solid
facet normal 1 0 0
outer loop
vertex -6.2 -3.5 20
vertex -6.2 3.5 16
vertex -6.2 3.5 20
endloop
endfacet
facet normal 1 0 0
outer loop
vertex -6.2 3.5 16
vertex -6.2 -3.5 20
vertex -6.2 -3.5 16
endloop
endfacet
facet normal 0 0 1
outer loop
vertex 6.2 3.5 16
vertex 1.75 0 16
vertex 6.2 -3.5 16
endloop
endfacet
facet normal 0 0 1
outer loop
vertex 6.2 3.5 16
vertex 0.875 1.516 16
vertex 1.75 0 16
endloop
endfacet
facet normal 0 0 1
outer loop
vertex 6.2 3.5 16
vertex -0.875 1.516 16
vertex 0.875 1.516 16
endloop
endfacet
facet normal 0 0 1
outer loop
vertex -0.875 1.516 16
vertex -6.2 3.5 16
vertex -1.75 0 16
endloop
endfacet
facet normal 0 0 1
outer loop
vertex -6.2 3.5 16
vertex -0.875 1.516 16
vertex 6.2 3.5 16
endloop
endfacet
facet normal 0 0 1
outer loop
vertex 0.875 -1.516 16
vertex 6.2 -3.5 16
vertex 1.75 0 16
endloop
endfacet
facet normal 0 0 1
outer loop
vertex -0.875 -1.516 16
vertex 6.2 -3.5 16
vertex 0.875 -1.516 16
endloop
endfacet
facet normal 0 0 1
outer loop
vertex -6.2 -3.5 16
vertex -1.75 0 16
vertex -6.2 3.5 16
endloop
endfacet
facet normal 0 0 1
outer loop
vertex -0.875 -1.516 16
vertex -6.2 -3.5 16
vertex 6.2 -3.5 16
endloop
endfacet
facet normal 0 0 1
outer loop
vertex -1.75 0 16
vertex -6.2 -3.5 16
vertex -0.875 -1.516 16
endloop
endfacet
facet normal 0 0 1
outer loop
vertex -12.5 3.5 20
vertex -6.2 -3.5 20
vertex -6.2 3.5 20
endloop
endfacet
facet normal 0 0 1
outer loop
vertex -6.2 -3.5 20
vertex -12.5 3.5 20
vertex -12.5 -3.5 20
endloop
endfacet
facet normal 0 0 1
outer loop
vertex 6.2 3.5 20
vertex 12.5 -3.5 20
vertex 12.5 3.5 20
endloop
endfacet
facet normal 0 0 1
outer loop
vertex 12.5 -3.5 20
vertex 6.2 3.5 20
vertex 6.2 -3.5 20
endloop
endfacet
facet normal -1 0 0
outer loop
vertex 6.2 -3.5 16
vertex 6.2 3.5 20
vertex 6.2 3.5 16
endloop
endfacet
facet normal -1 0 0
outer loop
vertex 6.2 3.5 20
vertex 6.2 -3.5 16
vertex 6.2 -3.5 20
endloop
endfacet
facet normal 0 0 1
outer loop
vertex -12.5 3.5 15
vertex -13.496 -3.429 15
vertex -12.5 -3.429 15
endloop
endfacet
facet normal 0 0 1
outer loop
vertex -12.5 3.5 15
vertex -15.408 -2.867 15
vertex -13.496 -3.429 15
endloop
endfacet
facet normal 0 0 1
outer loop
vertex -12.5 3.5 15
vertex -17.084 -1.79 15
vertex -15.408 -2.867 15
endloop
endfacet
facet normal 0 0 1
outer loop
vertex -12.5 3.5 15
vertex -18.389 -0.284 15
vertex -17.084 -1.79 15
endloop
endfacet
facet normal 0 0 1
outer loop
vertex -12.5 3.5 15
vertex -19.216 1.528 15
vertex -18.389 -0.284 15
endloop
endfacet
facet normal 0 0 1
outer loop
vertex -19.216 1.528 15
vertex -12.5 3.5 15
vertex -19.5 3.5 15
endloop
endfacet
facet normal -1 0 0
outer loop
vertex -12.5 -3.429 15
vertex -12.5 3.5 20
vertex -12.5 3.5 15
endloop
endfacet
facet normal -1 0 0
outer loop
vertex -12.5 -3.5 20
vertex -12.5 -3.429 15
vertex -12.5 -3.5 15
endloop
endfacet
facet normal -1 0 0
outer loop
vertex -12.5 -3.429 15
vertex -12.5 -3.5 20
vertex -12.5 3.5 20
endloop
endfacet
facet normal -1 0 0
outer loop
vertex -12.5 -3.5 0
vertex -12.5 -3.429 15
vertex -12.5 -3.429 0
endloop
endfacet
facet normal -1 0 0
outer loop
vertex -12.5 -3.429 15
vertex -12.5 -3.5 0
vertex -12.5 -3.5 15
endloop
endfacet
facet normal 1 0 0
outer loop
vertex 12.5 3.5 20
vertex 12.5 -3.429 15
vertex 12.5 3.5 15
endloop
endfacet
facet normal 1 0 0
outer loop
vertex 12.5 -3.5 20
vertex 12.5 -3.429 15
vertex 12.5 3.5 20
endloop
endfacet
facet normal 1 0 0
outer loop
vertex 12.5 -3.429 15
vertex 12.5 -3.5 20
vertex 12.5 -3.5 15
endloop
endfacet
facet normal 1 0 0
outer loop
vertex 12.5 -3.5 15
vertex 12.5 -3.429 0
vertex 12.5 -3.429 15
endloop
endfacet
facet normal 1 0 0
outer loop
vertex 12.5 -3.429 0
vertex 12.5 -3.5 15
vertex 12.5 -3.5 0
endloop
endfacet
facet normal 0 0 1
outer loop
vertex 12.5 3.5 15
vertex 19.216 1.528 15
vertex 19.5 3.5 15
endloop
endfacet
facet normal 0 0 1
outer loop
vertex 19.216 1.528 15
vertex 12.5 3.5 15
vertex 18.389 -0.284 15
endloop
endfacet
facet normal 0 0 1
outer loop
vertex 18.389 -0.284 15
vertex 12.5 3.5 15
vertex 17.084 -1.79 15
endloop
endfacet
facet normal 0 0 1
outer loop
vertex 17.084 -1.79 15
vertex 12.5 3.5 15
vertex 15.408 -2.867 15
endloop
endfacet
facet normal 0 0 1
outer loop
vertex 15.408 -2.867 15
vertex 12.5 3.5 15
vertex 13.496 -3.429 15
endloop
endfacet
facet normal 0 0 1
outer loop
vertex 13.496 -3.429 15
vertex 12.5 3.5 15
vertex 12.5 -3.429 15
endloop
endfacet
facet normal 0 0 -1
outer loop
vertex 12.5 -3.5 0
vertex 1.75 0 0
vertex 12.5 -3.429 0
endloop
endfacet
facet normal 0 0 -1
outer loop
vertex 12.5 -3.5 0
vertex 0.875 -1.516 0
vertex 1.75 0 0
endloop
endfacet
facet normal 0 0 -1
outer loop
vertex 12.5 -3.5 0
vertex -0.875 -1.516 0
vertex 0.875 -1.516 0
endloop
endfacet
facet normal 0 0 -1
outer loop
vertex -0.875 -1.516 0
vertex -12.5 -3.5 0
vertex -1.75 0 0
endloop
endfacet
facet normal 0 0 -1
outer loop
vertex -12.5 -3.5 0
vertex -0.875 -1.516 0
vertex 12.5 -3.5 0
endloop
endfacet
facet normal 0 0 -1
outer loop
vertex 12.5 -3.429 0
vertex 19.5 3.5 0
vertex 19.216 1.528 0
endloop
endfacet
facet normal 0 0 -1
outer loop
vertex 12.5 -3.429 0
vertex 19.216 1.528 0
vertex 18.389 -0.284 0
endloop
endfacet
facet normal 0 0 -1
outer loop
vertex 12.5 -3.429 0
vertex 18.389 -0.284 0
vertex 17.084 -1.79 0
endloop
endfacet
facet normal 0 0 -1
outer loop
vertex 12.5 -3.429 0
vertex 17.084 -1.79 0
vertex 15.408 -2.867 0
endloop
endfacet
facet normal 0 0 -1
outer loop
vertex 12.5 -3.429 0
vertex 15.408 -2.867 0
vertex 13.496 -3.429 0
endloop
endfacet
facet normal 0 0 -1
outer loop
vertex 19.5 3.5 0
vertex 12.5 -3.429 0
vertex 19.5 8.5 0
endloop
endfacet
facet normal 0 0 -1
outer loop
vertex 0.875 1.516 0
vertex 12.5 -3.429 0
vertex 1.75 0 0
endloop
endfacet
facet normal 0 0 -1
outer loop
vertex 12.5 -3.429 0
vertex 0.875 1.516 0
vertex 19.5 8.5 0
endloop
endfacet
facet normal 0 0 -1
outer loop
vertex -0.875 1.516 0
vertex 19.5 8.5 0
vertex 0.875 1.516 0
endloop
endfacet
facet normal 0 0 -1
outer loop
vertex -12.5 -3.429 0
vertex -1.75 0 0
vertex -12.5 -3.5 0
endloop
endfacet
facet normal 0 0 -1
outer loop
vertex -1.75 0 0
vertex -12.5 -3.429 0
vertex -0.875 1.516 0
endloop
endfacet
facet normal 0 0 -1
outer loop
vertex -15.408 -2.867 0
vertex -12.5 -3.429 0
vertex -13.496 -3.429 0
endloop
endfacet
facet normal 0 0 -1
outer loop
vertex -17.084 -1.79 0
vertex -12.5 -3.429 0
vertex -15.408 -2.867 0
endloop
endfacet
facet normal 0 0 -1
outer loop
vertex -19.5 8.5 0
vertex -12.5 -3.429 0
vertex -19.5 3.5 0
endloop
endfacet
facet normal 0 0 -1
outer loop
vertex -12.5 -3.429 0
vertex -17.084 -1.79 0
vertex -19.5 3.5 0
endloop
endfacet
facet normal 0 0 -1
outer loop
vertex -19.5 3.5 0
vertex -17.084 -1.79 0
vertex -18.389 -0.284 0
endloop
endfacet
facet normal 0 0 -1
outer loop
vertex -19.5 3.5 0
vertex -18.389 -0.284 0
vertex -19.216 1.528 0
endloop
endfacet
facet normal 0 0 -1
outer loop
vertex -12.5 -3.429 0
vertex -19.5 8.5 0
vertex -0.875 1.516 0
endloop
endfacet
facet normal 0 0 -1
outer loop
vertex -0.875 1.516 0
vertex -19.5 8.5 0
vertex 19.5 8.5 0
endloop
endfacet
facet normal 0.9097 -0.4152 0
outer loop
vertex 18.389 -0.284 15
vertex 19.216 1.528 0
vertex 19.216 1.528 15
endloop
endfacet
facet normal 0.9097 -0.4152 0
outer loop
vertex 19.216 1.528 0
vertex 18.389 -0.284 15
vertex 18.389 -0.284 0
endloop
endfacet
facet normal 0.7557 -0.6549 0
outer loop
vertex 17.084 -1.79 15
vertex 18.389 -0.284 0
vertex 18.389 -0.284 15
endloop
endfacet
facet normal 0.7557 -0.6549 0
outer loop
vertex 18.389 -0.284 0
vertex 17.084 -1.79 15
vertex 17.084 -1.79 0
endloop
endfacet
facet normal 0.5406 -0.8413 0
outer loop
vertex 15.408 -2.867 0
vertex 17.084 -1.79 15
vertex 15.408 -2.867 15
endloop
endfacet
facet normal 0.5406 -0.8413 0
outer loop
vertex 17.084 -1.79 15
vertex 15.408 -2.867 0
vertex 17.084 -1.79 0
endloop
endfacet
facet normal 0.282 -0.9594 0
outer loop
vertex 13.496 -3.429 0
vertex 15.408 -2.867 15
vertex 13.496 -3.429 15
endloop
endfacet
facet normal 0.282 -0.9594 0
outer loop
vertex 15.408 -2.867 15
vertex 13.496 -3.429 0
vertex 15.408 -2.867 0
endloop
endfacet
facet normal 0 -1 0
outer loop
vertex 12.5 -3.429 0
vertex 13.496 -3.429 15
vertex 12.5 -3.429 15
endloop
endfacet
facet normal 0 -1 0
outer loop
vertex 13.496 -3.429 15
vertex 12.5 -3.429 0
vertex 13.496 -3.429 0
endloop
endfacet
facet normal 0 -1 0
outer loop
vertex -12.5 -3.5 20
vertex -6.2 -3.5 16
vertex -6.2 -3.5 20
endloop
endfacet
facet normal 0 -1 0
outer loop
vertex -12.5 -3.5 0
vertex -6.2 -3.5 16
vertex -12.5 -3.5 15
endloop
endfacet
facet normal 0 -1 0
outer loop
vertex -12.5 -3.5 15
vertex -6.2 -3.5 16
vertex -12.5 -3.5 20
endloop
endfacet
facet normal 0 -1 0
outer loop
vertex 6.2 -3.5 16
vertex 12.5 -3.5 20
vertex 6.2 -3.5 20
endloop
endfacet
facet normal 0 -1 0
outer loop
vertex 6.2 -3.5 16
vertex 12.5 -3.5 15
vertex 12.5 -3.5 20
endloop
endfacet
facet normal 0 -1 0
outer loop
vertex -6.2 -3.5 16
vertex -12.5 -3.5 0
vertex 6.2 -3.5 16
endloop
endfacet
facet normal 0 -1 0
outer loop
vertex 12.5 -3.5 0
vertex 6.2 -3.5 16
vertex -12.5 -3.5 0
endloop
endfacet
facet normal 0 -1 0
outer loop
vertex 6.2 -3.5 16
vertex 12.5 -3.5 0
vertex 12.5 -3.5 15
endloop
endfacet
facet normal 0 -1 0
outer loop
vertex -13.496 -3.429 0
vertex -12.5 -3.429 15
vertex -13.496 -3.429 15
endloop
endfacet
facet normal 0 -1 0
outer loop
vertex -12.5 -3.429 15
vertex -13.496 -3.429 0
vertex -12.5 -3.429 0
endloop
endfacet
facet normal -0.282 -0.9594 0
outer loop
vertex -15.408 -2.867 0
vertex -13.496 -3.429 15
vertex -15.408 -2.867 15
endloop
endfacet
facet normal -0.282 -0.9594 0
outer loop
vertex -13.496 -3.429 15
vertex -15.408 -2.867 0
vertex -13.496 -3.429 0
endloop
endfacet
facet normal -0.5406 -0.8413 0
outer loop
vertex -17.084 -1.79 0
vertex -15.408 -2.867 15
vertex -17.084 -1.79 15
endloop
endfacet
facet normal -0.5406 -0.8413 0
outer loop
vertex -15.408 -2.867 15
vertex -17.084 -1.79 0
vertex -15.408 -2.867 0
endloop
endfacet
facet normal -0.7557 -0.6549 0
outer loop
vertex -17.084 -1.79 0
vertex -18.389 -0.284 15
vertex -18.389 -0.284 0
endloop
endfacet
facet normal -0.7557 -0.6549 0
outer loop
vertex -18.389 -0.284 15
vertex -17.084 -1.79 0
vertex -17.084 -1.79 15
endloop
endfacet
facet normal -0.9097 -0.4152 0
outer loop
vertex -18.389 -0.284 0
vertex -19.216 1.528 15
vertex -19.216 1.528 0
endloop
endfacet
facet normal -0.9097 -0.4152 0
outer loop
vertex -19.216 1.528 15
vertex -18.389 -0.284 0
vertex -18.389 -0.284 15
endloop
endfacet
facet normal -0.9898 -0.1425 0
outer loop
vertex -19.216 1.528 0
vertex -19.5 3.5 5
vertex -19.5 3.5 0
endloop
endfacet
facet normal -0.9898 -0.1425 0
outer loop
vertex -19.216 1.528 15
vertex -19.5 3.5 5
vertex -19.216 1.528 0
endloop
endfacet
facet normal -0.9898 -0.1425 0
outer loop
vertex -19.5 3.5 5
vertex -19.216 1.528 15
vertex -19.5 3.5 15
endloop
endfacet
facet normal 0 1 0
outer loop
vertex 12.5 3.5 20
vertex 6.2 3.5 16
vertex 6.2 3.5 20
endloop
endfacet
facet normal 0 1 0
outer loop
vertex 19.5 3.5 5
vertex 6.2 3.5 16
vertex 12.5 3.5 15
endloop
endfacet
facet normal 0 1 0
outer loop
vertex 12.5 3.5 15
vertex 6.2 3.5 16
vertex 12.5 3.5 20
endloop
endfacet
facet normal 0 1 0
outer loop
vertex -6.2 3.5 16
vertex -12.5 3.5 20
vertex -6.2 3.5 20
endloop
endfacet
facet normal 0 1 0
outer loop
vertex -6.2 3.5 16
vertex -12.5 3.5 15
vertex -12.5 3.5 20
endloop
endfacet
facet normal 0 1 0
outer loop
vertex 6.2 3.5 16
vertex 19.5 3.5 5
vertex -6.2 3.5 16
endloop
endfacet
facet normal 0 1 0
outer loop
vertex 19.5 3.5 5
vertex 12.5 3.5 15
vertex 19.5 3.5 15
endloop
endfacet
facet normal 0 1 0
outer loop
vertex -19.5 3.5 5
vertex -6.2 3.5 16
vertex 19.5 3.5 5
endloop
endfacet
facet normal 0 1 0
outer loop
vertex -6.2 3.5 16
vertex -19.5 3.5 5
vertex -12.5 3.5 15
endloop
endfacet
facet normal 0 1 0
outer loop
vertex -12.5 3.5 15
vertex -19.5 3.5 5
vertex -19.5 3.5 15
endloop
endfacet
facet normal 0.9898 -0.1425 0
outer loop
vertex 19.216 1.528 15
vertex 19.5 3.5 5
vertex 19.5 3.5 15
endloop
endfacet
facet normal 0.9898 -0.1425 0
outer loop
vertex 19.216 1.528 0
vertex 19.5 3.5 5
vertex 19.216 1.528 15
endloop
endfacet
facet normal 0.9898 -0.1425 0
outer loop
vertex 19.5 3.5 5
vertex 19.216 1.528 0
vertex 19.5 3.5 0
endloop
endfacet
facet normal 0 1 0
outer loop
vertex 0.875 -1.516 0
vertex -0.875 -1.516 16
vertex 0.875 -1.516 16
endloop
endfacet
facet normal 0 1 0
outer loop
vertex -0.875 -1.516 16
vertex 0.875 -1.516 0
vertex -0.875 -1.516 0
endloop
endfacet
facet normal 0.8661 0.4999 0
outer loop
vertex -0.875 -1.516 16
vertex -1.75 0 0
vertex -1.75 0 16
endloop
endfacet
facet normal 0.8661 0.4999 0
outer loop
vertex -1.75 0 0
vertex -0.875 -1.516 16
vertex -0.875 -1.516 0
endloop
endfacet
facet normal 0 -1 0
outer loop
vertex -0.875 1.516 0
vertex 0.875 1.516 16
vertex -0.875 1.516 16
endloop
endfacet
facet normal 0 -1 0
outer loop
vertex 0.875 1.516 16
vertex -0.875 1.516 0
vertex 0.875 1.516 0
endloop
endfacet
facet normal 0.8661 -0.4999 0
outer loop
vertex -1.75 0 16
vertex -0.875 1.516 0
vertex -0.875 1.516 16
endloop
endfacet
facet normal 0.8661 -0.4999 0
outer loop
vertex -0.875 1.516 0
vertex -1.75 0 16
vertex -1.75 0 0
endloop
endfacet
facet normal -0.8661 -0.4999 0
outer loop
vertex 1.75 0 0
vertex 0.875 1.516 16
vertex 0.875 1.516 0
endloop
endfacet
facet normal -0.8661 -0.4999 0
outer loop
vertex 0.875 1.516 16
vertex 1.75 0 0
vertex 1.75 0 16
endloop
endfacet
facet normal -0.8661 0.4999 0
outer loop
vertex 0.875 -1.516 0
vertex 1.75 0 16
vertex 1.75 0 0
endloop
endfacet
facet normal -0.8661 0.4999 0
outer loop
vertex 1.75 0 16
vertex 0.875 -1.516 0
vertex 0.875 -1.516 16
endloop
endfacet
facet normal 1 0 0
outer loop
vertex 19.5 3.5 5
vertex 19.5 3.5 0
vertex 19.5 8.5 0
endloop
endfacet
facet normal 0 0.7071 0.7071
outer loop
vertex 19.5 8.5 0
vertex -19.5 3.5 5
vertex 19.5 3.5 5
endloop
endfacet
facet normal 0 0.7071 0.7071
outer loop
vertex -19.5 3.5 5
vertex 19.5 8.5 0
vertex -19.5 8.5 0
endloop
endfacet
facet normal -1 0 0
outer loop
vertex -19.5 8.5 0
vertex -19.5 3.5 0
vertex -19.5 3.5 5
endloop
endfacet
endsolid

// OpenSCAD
//Sliding Supports

union(){
	rotate([0,180,0])translate([0,0,-20]){
		union(){
		difference(){
			linear_extrude(height=20){
				union(){
					square([25,7], center=true);
					difference(){
						translate([25/2,3.5,0])circle(7, center=true);
						translate([0,3.5,0])square([20,10]);
					}
					difference(){
						translate([-25/2,3.5,0])circle(7, center=true);
						translate([-23,3.5,0])square([20,10]);
					}
				}
			}
			union(){
				translate([0,0,2])cube([12.4,8,4], center=true);
				translate([20,0,2])cube([15,10,6], center=true);
				translate([-20,0,2])cube([15,10,6], center=true);
			}
			cylinder(20,1.75,1.75);
		}
		}
	}
	rotate([0,270,0])translate([0,3.5,-19.5])linear_extrude(height=39)polygon([[0,0],[0,5],[5,0]]);
}
